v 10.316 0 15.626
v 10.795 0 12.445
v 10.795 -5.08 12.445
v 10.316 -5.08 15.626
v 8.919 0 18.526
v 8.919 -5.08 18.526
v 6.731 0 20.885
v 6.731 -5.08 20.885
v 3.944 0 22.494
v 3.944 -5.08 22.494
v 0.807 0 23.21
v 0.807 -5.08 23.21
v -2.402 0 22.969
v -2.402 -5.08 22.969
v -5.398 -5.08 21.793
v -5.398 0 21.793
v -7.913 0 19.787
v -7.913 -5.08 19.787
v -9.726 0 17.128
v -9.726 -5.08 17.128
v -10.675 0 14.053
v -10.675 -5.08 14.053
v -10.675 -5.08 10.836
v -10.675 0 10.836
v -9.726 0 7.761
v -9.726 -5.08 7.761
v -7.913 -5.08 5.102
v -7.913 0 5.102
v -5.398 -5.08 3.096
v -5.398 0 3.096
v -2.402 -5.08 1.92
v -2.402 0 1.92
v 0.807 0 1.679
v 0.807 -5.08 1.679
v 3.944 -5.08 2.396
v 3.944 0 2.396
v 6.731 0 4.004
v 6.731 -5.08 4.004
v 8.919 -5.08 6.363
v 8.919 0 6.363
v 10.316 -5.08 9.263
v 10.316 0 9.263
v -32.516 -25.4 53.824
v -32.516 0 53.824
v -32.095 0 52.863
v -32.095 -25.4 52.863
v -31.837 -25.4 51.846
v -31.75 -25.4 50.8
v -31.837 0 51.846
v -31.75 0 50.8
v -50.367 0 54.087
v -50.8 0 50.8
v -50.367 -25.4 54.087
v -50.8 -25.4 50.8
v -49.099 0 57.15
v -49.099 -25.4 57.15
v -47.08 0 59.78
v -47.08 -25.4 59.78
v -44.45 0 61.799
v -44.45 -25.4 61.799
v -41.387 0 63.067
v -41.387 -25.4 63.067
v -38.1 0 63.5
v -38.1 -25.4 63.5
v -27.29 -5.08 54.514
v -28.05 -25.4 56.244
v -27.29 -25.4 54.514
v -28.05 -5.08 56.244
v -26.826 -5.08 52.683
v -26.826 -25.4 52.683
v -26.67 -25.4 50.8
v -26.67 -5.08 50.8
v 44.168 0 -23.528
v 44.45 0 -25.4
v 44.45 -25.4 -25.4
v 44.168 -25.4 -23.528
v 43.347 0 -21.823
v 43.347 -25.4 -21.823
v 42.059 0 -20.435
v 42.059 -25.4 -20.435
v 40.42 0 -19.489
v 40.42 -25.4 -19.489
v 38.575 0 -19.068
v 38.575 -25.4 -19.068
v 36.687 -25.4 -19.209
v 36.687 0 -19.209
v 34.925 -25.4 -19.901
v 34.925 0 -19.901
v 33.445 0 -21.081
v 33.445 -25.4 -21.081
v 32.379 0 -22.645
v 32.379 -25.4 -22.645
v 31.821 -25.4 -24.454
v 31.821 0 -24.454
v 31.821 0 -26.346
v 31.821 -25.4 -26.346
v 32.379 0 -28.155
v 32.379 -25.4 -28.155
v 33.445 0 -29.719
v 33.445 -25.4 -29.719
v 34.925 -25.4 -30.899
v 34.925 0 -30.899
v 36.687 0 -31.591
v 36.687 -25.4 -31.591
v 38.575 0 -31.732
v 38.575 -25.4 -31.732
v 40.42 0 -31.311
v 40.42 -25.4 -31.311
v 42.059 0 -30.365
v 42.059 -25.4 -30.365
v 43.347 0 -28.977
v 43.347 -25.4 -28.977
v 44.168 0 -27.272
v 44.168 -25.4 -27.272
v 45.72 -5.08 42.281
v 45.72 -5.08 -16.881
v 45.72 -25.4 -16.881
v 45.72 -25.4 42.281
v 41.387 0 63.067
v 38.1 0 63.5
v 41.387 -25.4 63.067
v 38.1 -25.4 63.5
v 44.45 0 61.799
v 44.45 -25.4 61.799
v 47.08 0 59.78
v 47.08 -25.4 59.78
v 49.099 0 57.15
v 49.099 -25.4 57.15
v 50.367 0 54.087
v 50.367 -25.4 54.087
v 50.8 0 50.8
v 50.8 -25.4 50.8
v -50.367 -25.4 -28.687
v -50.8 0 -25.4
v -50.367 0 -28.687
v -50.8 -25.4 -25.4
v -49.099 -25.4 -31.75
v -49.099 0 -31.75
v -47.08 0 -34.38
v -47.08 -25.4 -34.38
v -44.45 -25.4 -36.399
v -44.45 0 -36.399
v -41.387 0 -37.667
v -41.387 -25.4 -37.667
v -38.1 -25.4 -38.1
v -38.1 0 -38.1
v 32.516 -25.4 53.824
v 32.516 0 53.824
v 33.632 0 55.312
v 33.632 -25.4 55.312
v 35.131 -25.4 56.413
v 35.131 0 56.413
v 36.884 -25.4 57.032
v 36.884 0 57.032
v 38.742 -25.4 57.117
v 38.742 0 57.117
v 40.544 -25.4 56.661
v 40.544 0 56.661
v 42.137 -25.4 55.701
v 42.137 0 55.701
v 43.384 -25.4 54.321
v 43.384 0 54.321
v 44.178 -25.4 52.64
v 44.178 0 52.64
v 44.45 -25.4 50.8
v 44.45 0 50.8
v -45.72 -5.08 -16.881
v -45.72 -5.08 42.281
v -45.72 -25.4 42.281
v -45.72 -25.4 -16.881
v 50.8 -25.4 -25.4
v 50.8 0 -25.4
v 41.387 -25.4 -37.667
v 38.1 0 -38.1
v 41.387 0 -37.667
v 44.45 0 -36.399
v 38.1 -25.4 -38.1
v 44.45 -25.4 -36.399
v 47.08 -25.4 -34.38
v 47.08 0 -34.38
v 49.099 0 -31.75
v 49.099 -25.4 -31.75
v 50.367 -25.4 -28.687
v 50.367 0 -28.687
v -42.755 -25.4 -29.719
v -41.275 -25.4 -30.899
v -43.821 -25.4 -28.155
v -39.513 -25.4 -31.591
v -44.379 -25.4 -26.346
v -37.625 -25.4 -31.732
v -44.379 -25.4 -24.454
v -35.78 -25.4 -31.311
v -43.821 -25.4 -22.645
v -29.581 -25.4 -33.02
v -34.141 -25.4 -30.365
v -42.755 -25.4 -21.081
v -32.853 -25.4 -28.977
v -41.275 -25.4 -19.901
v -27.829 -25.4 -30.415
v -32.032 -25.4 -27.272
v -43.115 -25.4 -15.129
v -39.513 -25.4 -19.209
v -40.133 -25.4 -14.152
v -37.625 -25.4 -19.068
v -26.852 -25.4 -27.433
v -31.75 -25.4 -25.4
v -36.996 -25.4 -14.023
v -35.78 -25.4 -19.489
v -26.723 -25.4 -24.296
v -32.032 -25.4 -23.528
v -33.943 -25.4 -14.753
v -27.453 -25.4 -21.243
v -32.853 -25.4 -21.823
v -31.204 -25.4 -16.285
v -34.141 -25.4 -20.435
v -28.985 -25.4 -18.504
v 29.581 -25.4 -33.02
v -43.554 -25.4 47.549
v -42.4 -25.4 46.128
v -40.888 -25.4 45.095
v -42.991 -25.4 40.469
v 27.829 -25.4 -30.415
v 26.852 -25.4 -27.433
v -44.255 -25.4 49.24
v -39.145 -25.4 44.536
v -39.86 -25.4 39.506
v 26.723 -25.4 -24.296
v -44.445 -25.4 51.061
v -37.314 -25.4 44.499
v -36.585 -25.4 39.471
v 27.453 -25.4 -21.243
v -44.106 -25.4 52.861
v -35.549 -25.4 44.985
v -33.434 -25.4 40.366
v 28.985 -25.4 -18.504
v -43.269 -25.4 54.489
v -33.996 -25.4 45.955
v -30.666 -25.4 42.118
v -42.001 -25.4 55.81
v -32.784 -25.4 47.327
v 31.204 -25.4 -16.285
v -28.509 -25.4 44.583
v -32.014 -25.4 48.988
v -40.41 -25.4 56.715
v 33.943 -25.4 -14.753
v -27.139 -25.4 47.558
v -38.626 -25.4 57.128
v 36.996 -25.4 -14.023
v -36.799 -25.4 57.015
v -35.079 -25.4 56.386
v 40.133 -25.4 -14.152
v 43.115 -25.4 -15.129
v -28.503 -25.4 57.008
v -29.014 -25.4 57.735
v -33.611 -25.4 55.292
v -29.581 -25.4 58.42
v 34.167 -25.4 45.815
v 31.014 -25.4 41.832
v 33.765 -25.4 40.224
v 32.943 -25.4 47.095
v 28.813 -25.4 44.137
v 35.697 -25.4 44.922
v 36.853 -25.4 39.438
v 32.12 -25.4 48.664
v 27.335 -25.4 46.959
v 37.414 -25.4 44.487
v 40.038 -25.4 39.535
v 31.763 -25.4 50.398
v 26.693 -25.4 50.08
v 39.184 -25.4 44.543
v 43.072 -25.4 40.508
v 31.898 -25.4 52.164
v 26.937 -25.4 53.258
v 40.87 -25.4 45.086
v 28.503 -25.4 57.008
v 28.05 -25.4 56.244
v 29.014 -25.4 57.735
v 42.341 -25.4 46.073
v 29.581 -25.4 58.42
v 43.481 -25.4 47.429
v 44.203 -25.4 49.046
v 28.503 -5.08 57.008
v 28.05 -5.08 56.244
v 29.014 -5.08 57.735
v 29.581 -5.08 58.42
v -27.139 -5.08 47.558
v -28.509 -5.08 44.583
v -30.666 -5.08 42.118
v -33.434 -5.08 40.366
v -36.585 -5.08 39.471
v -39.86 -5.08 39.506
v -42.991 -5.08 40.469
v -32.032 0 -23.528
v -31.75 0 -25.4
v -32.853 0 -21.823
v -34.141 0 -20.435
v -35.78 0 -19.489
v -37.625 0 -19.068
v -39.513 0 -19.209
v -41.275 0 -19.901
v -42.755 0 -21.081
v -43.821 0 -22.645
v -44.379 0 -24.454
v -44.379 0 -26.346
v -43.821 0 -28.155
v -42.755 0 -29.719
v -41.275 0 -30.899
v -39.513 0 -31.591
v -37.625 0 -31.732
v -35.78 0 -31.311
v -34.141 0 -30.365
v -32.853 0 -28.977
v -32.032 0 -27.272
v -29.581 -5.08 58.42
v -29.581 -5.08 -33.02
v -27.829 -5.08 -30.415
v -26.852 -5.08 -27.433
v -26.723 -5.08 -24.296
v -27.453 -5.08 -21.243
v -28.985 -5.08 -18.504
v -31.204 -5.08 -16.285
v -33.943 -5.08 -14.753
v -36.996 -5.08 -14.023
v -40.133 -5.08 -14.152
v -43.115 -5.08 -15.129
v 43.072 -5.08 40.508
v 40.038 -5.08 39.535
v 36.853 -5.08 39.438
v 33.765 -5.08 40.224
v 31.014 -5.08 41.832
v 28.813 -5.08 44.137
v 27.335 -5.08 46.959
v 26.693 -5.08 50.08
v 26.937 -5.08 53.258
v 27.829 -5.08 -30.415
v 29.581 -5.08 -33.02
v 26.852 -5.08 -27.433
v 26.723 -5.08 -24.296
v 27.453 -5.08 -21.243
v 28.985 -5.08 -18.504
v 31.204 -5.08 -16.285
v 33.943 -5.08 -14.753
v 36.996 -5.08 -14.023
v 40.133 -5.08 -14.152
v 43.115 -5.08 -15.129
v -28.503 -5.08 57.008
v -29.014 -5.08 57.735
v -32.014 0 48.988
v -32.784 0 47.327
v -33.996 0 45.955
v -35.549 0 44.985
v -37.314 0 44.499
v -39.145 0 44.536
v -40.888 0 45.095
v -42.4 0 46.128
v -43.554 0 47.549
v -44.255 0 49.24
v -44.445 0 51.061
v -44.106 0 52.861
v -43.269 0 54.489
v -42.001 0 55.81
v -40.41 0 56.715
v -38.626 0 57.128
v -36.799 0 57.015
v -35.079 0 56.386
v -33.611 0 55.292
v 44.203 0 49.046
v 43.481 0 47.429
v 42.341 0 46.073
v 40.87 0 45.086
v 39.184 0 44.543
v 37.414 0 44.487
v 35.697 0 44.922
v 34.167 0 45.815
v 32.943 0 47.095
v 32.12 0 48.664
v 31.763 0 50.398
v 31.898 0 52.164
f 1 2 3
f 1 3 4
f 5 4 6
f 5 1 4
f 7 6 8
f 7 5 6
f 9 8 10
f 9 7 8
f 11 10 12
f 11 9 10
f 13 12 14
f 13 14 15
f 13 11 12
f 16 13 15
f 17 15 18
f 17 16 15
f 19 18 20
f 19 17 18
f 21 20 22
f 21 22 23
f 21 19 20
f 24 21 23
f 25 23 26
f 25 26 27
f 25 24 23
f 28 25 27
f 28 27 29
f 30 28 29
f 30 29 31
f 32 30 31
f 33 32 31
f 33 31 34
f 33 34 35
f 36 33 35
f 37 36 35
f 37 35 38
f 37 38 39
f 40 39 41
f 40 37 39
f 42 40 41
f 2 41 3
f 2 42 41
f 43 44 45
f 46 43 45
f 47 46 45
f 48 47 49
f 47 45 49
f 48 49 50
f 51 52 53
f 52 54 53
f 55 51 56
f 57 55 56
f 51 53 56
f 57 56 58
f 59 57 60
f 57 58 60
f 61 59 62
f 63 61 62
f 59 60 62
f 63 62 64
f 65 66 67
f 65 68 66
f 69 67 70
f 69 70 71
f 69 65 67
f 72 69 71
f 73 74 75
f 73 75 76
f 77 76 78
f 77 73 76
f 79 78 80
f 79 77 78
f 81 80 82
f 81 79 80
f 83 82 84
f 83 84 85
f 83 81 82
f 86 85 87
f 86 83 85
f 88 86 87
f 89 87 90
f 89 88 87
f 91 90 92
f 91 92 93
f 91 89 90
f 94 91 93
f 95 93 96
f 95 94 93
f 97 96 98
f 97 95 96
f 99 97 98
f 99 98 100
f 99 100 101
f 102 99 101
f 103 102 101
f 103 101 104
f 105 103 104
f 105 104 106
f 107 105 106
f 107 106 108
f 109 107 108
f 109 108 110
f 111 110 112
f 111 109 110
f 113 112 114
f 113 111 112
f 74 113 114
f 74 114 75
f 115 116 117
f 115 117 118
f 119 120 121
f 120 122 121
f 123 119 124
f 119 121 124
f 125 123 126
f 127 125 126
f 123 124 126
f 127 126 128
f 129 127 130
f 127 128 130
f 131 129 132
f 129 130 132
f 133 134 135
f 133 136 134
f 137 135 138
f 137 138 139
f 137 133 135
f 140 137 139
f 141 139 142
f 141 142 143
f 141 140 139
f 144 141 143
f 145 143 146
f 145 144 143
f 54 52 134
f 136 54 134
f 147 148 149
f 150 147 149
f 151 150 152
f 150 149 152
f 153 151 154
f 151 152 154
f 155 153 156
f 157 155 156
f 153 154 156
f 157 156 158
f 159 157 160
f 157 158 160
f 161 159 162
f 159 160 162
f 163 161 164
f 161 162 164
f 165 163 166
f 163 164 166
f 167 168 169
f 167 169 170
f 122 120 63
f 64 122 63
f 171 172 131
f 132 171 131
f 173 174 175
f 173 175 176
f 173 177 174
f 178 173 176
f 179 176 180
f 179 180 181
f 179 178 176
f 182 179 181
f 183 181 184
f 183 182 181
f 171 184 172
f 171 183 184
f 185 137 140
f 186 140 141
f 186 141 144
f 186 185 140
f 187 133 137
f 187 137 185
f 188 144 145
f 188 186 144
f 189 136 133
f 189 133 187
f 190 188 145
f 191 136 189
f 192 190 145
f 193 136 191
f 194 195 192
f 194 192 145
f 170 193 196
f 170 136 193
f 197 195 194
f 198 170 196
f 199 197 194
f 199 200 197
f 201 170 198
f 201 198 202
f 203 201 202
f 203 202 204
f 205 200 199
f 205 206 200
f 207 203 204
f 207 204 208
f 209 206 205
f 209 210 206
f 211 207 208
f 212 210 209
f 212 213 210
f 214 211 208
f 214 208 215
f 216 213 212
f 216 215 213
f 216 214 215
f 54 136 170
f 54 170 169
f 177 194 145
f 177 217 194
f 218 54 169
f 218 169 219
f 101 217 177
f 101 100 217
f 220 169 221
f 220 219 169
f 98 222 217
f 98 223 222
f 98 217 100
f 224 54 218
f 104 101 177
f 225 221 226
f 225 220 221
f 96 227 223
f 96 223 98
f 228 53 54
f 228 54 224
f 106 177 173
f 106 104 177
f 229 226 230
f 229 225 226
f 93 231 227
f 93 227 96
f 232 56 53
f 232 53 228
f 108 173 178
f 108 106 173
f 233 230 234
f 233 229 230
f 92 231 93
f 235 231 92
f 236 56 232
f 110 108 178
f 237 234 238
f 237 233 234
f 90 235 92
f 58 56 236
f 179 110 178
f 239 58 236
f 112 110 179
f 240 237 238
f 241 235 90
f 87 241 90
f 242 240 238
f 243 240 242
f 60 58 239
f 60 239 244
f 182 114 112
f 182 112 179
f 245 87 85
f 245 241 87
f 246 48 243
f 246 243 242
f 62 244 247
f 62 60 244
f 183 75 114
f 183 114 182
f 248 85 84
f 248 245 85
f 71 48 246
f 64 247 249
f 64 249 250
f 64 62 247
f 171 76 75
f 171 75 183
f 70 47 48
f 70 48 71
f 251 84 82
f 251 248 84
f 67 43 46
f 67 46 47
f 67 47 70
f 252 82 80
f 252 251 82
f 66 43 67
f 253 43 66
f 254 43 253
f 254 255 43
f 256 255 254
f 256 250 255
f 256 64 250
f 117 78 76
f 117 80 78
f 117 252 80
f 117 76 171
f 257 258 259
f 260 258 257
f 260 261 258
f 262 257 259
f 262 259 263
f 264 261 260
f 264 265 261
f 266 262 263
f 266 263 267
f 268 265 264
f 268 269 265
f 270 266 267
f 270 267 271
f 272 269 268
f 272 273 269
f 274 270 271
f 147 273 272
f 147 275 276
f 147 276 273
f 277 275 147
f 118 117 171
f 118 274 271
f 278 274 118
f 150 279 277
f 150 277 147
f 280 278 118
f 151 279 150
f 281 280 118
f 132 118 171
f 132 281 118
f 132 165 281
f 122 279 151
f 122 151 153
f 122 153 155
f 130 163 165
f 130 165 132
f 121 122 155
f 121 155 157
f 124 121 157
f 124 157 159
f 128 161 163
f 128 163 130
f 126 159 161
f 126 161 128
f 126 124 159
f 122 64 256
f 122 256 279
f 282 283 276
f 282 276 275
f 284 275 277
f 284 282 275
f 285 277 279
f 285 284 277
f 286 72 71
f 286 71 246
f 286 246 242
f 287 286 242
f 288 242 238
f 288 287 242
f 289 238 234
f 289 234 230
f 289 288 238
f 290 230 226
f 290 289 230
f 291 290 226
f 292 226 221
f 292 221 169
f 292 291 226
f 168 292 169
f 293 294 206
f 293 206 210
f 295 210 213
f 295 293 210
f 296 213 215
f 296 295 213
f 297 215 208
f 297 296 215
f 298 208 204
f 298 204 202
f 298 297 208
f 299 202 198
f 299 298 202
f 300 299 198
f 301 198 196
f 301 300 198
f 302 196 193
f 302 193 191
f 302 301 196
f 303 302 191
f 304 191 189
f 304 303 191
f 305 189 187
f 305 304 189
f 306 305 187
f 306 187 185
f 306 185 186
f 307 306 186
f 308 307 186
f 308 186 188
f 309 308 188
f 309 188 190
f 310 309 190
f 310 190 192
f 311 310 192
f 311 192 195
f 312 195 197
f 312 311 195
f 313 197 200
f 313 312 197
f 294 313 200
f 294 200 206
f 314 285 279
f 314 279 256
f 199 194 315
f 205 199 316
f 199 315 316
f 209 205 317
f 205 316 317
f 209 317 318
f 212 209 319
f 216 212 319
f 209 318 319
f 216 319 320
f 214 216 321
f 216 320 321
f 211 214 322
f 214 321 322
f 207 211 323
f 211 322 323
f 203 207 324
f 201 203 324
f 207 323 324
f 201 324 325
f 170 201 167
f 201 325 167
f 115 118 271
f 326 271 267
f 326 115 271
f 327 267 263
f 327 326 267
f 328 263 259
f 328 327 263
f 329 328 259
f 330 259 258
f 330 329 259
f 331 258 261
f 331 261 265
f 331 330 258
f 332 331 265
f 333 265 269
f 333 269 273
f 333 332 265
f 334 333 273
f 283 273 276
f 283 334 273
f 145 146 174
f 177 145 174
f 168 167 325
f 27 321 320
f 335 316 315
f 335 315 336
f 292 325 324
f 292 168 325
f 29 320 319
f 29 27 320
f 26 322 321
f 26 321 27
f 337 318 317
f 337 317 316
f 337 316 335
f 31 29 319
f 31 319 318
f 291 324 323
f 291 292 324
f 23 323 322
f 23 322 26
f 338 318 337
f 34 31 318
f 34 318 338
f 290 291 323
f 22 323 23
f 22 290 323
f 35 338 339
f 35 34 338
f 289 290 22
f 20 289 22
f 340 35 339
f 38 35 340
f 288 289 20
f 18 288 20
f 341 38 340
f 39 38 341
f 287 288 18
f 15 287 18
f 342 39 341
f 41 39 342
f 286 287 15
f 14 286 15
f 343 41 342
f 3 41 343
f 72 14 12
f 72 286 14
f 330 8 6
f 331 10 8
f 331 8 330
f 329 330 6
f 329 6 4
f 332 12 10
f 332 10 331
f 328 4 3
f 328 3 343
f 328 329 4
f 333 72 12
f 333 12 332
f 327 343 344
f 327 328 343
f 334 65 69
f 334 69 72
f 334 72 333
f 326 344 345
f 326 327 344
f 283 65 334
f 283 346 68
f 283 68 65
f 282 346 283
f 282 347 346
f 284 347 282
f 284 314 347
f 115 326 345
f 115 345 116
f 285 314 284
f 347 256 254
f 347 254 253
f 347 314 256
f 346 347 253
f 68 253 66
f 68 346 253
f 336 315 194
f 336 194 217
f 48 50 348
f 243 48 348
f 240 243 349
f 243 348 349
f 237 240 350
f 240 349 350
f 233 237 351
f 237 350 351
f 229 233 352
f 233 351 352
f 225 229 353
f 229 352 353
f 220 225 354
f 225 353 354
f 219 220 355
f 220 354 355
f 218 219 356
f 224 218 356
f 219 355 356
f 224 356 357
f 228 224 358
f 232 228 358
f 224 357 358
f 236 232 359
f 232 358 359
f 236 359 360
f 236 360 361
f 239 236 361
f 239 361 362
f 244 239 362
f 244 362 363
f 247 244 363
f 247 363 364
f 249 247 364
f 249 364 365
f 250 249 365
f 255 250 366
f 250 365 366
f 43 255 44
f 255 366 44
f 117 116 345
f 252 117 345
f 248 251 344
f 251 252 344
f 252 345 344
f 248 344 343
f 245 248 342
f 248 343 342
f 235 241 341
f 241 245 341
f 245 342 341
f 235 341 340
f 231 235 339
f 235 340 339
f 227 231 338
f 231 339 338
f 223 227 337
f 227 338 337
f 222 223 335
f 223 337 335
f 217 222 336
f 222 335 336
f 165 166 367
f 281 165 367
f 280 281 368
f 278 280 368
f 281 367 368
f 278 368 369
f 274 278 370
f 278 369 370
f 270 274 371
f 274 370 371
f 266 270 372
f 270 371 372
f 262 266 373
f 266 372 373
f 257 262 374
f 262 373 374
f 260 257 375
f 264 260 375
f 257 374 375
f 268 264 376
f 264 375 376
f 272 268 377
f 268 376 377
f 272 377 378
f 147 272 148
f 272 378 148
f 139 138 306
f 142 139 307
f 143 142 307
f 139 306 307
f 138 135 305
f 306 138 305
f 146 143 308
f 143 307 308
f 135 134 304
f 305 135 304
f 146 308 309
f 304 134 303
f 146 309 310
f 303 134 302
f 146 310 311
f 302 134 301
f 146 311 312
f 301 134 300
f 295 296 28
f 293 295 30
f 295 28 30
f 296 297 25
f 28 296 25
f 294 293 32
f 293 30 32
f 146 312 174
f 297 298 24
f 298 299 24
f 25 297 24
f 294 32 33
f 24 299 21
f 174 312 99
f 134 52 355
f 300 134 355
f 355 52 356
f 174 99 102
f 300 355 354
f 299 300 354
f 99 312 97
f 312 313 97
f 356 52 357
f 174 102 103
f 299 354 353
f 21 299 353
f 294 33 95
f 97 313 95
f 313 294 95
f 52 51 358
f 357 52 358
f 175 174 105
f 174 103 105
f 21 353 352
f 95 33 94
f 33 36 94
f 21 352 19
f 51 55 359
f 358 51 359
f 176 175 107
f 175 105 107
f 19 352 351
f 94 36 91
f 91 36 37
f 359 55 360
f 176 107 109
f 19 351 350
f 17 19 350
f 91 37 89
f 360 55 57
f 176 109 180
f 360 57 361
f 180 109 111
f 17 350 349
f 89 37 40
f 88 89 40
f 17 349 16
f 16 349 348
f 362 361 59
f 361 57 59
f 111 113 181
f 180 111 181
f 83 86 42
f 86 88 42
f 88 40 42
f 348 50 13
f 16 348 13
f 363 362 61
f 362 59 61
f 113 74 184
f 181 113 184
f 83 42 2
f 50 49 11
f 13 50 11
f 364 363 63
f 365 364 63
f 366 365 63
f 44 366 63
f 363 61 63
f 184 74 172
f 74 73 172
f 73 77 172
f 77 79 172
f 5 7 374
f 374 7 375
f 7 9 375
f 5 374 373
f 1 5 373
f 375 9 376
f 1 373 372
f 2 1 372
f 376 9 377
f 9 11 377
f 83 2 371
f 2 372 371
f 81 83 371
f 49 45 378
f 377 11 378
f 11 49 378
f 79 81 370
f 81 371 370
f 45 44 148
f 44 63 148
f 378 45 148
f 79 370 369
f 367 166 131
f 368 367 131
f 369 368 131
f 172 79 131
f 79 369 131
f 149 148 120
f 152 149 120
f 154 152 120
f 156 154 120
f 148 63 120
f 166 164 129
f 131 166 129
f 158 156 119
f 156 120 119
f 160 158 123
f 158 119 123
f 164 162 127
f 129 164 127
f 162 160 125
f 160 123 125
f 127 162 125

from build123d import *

# Parameters (mm, degrees)
F0_R     = 6.35
F1_DEPTH = 25.4
F2_R     = 12.7
F3_R     = 12.7
F4_T     = -5.08
F6_R     = 10.7952537359
F5_DEPTH = 5.08


with BuildPart() as f1:
    # F0 (on Front) → F1 (new body)
    with BuildSketch(Plane.XZ):
        with BuildLine():
            Line((0, 63.5), (-36.1179809239, 63.5))
            ThreePointArc((-36.1179809239, 63.5), (-34.6565238325, 58.535797401), (-32.5163963302, 53.8242139571))
            ThreePointArc((-32.5163963302, 53.8242139571), (1.97e-08, 34.4563321571), (32.516396349, 53.8242139918))
            ThreePointArc((32.516396349, 53.8242139918), (34.6565238393, 58.5357974195), (36.1179809239, 63.5))
            Line((36.1179809239, 63.5), (0, 63.5))
        make_face()
        with BuildLine():
            Line((-36.1179809239, 63.5), (-50.8, 63.5))
            Line((-50.8, 63.5), (-50.8, -38.1))
            Line((-50.8, -38.1), (50.8, -38.1))
            Line((50.8, -38.1), (50.8, 63.5))
            Line((50.8, 63.5), (36.1179809239, 63.5))
            ThreePointArc((36.1179809239, 63.5), (34.6565238393, 58.5357974195), (32.516396349, 53.8242139918))
            ThreePointArc((32.516396349, 53.8242139918), (1.97e-08, 34.4563321571), (-32.5163963302, 53.8242139571))
            ThreePointArc((-32.5163963302, 53.8242139571), (-34.6565238325, 58.535797401), (-36.1179809239, 63.5))
        make_face()
        with Locations((-38.1, -25.4)):
            Circle(F0_R, mode=Mode.SUBTRACT)
        with Locations((38.1, -25.4)):
            Circle(F0_R, mode=Mode.SUBTRACT)
        with BuildLine():
            ThreePointArc((-31.75, 50.8), (-44.2554196974, 49.2400934809), (-32.5163963302, 53.8242139571))
            ThreePointArc((-32.5163963302, 53.8242139571), (-31.9445803026, 52.3599065191), (-31.75, 50.8))
        make_face(mode=Mode.SUBTRACT)
        with BuildLine():
            ThreePointArc((44.45, 50.8), (36.5400934618, 44.6445803074), (32.516396349, 53.8242139918))
            ThreePointArc((32.516396349, 53.8242139918), (39.6599065382, 56.9554196926), (44.45, 50.8))
        make_face(mode=Mode.SUBTRACT)
    extrude(amount=F1_DEPTH)

    # F2
    f2_edges = [f1.edges().sort_by_distance(p)[0] for p in [
        (-50.8, -12.7, -38.1),
        (50.8, -12.7, -38.1),
    ]]
    fillet(f2_edges, radius=F2_R)

    # F3
    f3_edges = [f1.edges().sort_by_distance(p)[0] for p in [
        (-50.8, -12.7, 63.5),
        (50.8, -12.7, 63.5),
    ]]
    fillet(f3_edges, radius=F3_R)

    # F4
    f4_openings = [f1.faces().sort_by_distance(p)[0] for p in [
        (0, -25.4, 12.7),
    ]]
    offset(amount=F4_T, openings=f4_openings, kind=Kind.INTERSECTION)

    # F6 (on face) → F5 (cut, through all)
    with BuildSketch(Plane.XZ):
        with Locations((0, 12.4445185065)):
            Circle(F6_R)
    extrude(amount=F5_DEPTH, mode=Mode.SUBTRACT)


solid = f1.part
